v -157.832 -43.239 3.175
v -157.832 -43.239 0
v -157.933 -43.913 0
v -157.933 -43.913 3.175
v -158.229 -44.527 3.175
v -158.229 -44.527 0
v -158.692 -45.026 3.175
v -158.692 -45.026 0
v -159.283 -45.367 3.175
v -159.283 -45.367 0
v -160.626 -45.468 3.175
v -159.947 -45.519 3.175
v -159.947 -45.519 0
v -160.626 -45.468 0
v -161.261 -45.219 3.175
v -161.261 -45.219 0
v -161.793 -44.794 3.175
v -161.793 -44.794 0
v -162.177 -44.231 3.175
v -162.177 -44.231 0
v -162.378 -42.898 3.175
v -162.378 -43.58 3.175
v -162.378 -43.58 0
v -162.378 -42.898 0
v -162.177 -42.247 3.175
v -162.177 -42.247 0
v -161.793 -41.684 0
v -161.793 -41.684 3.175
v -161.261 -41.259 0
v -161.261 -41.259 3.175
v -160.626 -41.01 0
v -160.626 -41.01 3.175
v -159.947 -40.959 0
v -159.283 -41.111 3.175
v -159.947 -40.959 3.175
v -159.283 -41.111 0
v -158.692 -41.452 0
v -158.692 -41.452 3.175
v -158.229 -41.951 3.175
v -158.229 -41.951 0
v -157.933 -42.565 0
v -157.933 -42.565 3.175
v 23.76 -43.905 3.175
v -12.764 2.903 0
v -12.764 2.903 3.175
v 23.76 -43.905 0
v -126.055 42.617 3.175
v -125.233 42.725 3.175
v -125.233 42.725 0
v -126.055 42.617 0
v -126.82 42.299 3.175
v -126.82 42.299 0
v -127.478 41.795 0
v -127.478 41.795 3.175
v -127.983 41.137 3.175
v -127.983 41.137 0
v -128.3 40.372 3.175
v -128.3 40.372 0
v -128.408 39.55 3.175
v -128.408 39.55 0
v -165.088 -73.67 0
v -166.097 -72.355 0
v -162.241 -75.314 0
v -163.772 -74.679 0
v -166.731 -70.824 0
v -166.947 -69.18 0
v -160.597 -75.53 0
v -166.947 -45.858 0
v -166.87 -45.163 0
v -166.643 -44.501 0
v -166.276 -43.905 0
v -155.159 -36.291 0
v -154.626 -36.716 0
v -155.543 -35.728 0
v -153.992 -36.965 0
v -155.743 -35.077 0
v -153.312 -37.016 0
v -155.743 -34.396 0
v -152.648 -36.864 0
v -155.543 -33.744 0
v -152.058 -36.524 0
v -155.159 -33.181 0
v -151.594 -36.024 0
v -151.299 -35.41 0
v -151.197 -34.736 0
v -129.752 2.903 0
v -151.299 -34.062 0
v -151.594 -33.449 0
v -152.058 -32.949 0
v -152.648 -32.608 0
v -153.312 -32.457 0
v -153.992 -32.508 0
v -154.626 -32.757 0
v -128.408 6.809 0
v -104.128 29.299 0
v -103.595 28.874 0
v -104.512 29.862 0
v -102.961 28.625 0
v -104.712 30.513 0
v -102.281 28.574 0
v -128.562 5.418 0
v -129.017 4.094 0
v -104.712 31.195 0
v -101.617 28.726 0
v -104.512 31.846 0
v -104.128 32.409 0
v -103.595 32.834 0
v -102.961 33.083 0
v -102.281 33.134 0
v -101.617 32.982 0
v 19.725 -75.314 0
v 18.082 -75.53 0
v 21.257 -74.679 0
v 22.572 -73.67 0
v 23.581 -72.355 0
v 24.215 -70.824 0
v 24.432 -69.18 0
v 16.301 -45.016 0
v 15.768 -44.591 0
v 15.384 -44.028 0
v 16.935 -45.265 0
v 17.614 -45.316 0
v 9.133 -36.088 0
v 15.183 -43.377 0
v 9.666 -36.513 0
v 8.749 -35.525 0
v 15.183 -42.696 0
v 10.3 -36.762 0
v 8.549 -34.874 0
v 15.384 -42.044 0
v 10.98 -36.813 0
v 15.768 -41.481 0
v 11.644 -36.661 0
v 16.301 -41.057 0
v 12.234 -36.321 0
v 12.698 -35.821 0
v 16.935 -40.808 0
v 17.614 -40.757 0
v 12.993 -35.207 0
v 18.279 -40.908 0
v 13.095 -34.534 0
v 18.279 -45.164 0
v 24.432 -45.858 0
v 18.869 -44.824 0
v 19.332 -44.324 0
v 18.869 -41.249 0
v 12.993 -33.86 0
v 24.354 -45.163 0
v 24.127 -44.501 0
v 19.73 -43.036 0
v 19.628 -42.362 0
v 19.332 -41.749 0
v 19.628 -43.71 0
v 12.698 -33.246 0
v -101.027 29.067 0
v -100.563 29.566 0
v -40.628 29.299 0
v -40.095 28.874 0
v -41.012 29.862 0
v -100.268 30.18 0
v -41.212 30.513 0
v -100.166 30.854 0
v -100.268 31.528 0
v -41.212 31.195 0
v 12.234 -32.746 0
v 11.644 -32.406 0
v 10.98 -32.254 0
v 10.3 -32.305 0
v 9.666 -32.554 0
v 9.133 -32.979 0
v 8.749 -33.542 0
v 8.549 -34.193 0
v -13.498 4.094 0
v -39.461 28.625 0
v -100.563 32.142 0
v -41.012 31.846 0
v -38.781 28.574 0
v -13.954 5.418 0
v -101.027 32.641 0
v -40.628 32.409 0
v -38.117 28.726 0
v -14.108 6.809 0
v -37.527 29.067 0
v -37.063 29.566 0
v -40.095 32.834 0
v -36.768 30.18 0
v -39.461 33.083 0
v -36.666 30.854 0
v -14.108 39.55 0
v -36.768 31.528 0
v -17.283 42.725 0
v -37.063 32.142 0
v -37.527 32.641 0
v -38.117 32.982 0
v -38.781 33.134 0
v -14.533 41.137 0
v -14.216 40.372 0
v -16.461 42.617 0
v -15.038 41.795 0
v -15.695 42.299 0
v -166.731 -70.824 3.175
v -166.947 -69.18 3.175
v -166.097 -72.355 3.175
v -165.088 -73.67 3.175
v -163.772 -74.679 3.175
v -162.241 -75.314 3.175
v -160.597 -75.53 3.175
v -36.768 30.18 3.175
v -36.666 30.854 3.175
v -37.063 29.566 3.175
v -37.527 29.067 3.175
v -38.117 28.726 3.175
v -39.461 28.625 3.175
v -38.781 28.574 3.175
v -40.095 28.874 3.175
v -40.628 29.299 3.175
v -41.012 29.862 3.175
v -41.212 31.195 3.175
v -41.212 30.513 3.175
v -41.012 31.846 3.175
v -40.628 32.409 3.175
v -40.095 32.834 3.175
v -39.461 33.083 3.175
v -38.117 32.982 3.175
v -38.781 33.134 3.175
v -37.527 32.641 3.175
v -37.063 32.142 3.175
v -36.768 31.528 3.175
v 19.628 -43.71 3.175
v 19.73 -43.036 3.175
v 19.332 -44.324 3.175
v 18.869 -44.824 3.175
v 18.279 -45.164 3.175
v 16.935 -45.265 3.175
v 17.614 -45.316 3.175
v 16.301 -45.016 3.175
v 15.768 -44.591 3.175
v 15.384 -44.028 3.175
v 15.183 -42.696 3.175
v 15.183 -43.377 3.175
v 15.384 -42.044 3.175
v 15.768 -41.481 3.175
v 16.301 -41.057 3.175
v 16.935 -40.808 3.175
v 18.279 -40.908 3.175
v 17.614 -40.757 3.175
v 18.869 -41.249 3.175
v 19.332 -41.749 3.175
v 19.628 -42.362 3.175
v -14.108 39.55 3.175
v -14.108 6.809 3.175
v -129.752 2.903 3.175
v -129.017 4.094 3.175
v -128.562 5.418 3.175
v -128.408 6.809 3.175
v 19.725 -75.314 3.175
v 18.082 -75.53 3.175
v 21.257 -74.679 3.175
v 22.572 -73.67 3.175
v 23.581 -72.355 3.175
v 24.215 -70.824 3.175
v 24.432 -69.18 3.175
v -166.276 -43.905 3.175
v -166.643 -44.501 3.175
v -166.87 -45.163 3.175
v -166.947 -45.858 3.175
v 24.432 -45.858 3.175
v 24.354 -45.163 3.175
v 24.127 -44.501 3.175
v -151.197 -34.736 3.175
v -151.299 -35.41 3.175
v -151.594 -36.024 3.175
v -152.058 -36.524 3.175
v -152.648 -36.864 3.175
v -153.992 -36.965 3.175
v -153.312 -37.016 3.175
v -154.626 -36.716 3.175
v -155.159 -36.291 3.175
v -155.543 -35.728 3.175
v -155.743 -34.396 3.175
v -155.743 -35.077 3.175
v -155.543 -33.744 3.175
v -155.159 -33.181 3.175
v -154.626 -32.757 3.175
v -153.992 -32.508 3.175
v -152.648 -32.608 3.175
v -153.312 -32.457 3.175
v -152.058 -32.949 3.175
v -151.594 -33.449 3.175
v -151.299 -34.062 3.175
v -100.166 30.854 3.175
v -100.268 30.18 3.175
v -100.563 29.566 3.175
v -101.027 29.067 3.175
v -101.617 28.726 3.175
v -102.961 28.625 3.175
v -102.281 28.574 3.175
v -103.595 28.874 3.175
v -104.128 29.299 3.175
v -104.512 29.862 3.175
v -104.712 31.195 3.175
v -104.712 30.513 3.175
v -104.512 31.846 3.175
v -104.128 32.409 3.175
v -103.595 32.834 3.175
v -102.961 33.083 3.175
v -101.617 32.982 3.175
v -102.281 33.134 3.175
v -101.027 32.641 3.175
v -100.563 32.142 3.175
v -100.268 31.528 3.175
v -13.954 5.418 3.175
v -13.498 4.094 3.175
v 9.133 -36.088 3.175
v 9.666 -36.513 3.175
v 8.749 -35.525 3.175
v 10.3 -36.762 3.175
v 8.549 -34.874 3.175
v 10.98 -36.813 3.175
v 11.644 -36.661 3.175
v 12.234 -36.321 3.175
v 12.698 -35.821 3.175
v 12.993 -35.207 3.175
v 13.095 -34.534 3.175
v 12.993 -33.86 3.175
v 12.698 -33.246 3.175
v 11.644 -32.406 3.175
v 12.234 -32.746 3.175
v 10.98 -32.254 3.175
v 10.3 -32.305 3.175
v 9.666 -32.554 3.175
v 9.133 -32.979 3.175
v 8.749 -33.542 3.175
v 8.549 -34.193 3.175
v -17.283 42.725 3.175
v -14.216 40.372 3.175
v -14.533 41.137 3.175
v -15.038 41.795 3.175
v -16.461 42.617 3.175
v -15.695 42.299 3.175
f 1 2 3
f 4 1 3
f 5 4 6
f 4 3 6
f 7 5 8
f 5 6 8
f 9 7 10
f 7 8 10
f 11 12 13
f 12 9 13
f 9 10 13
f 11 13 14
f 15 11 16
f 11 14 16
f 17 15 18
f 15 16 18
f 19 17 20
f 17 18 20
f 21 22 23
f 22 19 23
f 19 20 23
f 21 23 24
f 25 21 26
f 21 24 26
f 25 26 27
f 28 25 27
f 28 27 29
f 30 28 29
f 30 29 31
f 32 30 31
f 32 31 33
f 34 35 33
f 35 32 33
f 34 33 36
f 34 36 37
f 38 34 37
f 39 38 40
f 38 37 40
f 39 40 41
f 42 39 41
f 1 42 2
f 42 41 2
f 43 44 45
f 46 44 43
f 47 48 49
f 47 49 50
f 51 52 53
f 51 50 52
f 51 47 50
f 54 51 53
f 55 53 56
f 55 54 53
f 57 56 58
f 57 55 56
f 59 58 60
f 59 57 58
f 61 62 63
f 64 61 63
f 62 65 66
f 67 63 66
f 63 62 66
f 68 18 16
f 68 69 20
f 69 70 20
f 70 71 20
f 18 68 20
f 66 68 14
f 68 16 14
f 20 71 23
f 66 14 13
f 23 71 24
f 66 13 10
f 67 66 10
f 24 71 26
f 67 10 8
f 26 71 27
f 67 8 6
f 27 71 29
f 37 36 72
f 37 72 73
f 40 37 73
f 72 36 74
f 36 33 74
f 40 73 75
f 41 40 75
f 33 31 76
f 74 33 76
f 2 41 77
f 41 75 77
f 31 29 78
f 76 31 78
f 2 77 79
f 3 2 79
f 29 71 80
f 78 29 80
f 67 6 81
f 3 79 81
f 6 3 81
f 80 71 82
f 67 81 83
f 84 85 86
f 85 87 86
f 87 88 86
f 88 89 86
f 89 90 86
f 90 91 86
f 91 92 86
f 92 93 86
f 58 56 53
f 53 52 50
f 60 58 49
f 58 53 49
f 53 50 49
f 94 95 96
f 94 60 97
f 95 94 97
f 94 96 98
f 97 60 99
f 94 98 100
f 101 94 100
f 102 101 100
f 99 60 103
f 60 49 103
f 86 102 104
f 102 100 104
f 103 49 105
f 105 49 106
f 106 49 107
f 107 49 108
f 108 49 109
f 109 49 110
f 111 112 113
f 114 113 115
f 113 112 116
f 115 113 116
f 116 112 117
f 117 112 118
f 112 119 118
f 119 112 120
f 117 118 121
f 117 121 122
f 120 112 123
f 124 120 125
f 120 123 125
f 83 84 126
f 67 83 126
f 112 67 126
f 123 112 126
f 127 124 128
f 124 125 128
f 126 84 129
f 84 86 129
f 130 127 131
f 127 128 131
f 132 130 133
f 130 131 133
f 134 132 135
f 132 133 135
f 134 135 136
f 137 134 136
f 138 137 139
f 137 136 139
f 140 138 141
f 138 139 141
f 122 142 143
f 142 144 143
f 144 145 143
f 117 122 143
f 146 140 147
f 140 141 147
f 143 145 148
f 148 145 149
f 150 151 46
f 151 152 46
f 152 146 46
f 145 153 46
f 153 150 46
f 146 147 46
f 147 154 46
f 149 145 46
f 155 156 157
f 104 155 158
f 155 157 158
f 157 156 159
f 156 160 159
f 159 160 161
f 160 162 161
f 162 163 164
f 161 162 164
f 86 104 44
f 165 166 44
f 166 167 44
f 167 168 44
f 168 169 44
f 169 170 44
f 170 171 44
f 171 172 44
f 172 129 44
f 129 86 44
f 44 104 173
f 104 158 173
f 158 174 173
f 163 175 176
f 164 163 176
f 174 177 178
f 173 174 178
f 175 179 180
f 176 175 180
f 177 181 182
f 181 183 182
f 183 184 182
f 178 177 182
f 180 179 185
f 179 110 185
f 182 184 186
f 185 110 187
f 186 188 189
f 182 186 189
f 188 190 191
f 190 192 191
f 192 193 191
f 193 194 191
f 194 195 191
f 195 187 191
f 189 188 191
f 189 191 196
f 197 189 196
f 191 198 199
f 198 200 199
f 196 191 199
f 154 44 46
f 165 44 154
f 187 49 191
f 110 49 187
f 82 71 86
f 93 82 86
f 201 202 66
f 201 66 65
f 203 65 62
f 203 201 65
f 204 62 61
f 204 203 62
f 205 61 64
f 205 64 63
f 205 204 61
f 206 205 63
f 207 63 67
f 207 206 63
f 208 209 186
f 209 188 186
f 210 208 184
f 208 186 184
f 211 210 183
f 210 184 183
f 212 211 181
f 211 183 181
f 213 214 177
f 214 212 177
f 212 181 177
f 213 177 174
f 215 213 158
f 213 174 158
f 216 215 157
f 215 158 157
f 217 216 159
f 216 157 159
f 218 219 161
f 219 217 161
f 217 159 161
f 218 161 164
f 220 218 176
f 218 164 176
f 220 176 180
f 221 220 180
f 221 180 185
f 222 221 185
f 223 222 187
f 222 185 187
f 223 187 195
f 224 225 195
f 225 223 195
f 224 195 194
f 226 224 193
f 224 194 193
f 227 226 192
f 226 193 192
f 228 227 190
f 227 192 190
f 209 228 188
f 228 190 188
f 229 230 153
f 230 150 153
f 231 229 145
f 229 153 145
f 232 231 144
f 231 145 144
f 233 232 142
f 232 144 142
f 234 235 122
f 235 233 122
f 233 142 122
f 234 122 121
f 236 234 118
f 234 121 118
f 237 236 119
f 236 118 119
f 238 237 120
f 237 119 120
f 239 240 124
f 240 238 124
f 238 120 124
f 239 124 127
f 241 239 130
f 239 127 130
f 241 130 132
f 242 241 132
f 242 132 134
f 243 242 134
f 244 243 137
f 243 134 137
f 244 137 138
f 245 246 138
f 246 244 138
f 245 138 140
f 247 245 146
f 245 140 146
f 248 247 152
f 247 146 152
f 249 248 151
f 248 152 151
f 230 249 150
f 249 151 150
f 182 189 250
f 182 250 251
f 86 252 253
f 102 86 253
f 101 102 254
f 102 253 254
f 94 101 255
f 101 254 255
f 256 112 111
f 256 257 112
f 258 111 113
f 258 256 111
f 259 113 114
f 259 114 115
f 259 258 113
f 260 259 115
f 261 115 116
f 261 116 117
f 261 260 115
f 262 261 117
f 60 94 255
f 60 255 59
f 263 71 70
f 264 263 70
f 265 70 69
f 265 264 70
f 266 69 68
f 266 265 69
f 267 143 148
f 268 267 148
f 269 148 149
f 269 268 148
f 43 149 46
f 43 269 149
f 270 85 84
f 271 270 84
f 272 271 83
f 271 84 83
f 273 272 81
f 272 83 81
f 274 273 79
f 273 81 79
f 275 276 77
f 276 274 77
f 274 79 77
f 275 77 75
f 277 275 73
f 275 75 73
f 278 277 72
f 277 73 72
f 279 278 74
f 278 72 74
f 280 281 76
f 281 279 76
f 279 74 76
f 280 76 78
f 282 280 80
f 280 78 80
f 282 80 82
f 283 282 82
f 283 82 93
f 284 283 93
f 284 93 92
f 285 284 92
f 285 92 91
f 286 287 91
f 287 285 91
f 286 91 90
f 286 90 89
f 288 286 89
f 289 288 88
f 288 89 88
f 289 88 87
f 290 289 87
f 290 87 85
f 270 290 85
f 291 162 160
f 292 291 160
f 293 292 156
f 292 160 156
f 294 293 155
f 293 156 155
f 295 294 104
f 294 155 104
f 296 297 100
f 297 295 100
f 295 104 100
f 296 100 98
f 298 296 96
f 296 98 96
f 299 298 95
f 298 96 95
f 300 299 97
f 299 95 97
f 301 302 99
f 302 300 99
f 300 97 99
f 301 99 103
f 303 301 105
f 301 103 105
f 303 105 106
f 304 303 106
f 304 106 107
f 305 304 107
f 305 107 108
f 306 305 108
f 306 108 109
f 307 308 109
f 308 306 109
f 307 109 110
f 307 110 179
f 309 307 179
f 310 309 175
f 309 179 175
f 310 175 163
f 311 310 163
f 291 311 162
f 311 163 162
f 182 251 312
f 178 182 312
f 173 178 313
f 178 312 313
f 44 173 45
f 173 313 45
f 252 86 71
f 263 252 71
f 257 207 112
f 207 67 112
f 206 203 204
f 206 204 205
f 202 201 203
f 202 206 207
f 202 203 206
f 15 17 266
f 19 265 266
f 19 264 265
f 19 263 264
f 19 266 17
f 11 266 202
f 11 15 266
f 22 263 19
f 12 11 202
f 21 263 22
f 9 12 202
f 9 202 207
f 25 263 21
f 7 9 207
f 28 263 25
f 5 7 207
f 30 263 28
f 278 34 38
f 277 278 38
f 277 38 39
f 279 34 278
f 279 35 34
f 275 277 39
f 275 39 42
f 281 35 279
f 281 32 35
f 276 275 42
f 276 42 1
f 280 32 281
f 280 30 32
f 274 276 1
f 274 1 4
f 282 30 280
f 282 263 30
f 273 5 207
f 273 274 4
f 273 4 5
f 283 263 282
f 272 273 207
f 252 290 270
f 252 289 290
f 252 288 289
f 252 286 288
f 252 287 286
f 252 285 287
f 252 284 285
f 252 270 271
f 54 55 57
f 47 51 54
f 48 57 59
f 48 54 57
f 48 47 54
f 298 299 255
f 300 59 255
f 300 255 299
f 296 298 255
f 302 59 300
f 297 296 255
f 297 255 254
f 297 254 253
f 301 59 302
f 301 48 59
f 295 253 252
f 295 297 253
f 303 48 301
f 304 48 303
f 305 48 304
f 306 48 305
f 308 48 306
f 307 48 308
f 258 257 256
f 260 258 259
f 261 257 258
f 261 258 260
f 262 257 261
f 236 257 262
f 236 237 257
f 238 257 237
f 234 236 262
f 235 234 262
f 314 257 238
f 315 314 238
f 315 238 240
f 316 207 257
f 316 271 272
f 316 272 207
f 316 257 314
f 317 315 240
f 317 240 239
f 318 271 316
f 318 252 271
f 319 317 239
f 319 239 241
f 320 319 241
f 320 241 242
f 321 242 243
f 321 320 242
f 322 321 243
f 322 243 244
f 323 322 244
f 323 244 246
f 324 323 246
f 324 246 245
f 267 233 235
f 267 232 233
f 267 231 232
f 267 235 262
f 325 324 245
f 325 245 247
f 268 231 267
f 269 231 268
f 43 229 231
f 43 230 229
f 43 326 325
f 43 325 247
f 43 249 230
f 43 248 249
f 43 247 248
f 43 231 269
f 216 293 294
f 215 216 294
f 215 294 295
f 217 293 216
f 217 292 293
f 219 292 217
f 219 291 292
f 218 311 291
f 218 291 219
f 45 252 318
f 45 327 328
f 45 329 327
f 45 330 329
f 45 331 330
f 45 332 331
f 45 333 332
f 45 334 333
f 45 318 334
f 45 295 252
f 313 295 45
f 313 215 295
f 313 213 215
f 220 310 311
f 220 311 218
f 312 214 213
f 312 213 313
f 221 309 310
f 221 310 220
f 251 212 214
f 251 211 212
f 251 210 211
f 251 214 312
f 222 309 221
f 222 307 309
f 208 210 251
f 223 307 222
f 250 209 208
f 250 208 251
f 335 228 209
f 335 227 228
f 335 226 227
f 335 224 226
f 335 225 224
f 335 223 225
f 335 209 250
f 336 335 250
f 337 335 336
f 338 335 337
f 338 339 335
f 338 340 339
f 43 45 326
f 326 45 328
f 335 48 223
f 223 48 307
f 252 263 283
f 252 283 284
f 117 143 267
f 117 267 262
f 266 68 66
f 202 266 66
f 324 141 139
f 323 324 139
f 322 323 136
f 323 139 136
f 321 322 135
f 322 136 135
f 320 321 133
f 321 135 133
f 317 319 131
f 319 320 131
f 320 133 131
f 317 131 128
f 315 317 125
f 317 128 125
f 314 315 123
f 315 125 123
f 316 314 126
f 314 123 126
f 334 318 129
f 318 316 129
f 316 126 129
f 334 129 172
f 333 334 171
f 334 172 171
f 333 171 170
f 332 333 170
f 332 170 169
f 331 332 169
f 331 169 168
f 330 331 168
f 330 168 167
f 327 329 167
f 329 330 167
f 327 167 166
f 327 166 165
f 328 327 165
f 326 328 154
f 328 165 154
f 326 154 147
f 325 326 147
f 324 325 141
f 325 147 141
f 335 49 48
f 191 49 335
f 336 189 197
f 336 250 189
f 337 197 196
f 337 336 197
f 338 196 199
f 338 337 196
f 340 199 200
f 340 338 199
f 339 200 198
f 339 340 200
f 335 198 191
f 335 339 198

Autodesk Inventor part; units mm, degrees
ref_plane "YZ Plane" through (0, 0, 0) normal (1, 0, 0) x (0, 1, 0)
ref_plane "XZ Plane" through (0, 0, 0) normal (0, 1, 0) x (-1, 0, 0)
ref_plane "Work Plane1" through (34.6079, -50.31, 0) normal (0, 0, 1) x (1, 0, 0)
sketch "Sketch1" plane through (34.6079, -50.31, 0) normal (0, 0, 1) x (1, 0, 0)
  circle A0 centre (-188.0909, 15.5737) radius 4.445
  circle A1 centre (-194.7256, 7.071) radius 4.445
  circle A2 centre (-23.7989, 15.7765) radius 4.445
  circle A3 centre (-17.1643, 7.2737) radius 4.445
  line L0 (-188.0964, 20.0187) -> (-23.8044, 20.2215) construction
  line L1 (-48.7158, 54.9348) -> (8.8737, -18.8701)
  line L2 (-17.1592, 2.8288) -> (-194.7205, 2.626) construction
  line L3 (-163.0158, 54.9348) -> (-220.6053, -18.8701)
  line L4 (-174.2476, 54.9348) -> (-39.5273, 54.9348) construction
  line L5 (-163.0158, 54.9348) -> (-163.0158, 93.0348)
  line L6 (-163.0158, 93.0348) -> (-48.7158, 93.0348)
  line L7 (-48.7158, 93.0348) -> (-48.7158, 54.9348)
  line L8 (-286.9371, -18.8701) -> (2.6787, -18.8701)
  line L9 (-201.5553, 5.5438) -> (-201.5553, -18.8701)
  line L10 (-10.1763, 5.5438) -> (-10.1763, -18.8701)
  line L11 (-201.5553, -18.8701) -> (-201.5553, -25.2201)
  line L12 (-201.5553, -25.2201) -> (-10.1763, -25.2201)
  line L13 (-10.1763, -25.2201) -> (-10.1763, -18.8701)
  circle A4 centre (-194.7256, 7.071) radius 2.286 projected
  circle A5 centre (-188.0909, 15.5737) radius 2.286 projected
  circle A6 centre (-23.7989, 15.7765) radius 2.286 projected
  circle A7 centre (-17.1643, 7.2737) radius 2.286 projected
  circle A8 centre (-137.0599, 81.1641) radius 2.286 projected
  circle A9 centre (-73.5599, 81.1641) radius 2.286 projected
  point P0 (-34.6079, 50.31)
  point P1 (-20.2945, 18.5109)
  point P2 (-13.6599, 10.0082)
  point P3 (-191.5953, 18.3082)
  point P4 (-198.23, 9.8054)
  dimension "d0" = 8.89
  dimension "d1" = 8.89
  dimension "d2" = 8.89
  dimension "d3" = 8.89
  dimension "d6" = 114.3
  dimension "d7" = 38.1
  dimension "d10" = 19.05
  dimension "d11" = 19.05
  dimension "d12" = 6.35
extrude "Extrusion1" add sketch "Sketch1" along normal blind 3.175 contours A0 | A1 | A3 | A2 | L3 L5 L6 L7 L1 L10 L8 L9 | L8 L13 L12 L11
fillet "Fillet1" radius 3.175 4 edges at (-128.4079, 42.7248, 1.5875) (-14.1079, 42.7248, 1.5875) (-166.9474, -44.7663, 1.5875) (24.4315, -44.7663, 1.5875)
fillet "Fillet2" radius 6.35 2 edges at (-128.4079, 4.6248, 1.5875) (-14.1079, 4.6248, 1.5875)
fillet "Fillet3" radius 6.35 2 edges at (24.4315, -75.5302, 1.5875) (-166.9474, -75.5302, 1.5875)
properties part number "PolyRamp1" material "Polycarbonate, Smoke"
